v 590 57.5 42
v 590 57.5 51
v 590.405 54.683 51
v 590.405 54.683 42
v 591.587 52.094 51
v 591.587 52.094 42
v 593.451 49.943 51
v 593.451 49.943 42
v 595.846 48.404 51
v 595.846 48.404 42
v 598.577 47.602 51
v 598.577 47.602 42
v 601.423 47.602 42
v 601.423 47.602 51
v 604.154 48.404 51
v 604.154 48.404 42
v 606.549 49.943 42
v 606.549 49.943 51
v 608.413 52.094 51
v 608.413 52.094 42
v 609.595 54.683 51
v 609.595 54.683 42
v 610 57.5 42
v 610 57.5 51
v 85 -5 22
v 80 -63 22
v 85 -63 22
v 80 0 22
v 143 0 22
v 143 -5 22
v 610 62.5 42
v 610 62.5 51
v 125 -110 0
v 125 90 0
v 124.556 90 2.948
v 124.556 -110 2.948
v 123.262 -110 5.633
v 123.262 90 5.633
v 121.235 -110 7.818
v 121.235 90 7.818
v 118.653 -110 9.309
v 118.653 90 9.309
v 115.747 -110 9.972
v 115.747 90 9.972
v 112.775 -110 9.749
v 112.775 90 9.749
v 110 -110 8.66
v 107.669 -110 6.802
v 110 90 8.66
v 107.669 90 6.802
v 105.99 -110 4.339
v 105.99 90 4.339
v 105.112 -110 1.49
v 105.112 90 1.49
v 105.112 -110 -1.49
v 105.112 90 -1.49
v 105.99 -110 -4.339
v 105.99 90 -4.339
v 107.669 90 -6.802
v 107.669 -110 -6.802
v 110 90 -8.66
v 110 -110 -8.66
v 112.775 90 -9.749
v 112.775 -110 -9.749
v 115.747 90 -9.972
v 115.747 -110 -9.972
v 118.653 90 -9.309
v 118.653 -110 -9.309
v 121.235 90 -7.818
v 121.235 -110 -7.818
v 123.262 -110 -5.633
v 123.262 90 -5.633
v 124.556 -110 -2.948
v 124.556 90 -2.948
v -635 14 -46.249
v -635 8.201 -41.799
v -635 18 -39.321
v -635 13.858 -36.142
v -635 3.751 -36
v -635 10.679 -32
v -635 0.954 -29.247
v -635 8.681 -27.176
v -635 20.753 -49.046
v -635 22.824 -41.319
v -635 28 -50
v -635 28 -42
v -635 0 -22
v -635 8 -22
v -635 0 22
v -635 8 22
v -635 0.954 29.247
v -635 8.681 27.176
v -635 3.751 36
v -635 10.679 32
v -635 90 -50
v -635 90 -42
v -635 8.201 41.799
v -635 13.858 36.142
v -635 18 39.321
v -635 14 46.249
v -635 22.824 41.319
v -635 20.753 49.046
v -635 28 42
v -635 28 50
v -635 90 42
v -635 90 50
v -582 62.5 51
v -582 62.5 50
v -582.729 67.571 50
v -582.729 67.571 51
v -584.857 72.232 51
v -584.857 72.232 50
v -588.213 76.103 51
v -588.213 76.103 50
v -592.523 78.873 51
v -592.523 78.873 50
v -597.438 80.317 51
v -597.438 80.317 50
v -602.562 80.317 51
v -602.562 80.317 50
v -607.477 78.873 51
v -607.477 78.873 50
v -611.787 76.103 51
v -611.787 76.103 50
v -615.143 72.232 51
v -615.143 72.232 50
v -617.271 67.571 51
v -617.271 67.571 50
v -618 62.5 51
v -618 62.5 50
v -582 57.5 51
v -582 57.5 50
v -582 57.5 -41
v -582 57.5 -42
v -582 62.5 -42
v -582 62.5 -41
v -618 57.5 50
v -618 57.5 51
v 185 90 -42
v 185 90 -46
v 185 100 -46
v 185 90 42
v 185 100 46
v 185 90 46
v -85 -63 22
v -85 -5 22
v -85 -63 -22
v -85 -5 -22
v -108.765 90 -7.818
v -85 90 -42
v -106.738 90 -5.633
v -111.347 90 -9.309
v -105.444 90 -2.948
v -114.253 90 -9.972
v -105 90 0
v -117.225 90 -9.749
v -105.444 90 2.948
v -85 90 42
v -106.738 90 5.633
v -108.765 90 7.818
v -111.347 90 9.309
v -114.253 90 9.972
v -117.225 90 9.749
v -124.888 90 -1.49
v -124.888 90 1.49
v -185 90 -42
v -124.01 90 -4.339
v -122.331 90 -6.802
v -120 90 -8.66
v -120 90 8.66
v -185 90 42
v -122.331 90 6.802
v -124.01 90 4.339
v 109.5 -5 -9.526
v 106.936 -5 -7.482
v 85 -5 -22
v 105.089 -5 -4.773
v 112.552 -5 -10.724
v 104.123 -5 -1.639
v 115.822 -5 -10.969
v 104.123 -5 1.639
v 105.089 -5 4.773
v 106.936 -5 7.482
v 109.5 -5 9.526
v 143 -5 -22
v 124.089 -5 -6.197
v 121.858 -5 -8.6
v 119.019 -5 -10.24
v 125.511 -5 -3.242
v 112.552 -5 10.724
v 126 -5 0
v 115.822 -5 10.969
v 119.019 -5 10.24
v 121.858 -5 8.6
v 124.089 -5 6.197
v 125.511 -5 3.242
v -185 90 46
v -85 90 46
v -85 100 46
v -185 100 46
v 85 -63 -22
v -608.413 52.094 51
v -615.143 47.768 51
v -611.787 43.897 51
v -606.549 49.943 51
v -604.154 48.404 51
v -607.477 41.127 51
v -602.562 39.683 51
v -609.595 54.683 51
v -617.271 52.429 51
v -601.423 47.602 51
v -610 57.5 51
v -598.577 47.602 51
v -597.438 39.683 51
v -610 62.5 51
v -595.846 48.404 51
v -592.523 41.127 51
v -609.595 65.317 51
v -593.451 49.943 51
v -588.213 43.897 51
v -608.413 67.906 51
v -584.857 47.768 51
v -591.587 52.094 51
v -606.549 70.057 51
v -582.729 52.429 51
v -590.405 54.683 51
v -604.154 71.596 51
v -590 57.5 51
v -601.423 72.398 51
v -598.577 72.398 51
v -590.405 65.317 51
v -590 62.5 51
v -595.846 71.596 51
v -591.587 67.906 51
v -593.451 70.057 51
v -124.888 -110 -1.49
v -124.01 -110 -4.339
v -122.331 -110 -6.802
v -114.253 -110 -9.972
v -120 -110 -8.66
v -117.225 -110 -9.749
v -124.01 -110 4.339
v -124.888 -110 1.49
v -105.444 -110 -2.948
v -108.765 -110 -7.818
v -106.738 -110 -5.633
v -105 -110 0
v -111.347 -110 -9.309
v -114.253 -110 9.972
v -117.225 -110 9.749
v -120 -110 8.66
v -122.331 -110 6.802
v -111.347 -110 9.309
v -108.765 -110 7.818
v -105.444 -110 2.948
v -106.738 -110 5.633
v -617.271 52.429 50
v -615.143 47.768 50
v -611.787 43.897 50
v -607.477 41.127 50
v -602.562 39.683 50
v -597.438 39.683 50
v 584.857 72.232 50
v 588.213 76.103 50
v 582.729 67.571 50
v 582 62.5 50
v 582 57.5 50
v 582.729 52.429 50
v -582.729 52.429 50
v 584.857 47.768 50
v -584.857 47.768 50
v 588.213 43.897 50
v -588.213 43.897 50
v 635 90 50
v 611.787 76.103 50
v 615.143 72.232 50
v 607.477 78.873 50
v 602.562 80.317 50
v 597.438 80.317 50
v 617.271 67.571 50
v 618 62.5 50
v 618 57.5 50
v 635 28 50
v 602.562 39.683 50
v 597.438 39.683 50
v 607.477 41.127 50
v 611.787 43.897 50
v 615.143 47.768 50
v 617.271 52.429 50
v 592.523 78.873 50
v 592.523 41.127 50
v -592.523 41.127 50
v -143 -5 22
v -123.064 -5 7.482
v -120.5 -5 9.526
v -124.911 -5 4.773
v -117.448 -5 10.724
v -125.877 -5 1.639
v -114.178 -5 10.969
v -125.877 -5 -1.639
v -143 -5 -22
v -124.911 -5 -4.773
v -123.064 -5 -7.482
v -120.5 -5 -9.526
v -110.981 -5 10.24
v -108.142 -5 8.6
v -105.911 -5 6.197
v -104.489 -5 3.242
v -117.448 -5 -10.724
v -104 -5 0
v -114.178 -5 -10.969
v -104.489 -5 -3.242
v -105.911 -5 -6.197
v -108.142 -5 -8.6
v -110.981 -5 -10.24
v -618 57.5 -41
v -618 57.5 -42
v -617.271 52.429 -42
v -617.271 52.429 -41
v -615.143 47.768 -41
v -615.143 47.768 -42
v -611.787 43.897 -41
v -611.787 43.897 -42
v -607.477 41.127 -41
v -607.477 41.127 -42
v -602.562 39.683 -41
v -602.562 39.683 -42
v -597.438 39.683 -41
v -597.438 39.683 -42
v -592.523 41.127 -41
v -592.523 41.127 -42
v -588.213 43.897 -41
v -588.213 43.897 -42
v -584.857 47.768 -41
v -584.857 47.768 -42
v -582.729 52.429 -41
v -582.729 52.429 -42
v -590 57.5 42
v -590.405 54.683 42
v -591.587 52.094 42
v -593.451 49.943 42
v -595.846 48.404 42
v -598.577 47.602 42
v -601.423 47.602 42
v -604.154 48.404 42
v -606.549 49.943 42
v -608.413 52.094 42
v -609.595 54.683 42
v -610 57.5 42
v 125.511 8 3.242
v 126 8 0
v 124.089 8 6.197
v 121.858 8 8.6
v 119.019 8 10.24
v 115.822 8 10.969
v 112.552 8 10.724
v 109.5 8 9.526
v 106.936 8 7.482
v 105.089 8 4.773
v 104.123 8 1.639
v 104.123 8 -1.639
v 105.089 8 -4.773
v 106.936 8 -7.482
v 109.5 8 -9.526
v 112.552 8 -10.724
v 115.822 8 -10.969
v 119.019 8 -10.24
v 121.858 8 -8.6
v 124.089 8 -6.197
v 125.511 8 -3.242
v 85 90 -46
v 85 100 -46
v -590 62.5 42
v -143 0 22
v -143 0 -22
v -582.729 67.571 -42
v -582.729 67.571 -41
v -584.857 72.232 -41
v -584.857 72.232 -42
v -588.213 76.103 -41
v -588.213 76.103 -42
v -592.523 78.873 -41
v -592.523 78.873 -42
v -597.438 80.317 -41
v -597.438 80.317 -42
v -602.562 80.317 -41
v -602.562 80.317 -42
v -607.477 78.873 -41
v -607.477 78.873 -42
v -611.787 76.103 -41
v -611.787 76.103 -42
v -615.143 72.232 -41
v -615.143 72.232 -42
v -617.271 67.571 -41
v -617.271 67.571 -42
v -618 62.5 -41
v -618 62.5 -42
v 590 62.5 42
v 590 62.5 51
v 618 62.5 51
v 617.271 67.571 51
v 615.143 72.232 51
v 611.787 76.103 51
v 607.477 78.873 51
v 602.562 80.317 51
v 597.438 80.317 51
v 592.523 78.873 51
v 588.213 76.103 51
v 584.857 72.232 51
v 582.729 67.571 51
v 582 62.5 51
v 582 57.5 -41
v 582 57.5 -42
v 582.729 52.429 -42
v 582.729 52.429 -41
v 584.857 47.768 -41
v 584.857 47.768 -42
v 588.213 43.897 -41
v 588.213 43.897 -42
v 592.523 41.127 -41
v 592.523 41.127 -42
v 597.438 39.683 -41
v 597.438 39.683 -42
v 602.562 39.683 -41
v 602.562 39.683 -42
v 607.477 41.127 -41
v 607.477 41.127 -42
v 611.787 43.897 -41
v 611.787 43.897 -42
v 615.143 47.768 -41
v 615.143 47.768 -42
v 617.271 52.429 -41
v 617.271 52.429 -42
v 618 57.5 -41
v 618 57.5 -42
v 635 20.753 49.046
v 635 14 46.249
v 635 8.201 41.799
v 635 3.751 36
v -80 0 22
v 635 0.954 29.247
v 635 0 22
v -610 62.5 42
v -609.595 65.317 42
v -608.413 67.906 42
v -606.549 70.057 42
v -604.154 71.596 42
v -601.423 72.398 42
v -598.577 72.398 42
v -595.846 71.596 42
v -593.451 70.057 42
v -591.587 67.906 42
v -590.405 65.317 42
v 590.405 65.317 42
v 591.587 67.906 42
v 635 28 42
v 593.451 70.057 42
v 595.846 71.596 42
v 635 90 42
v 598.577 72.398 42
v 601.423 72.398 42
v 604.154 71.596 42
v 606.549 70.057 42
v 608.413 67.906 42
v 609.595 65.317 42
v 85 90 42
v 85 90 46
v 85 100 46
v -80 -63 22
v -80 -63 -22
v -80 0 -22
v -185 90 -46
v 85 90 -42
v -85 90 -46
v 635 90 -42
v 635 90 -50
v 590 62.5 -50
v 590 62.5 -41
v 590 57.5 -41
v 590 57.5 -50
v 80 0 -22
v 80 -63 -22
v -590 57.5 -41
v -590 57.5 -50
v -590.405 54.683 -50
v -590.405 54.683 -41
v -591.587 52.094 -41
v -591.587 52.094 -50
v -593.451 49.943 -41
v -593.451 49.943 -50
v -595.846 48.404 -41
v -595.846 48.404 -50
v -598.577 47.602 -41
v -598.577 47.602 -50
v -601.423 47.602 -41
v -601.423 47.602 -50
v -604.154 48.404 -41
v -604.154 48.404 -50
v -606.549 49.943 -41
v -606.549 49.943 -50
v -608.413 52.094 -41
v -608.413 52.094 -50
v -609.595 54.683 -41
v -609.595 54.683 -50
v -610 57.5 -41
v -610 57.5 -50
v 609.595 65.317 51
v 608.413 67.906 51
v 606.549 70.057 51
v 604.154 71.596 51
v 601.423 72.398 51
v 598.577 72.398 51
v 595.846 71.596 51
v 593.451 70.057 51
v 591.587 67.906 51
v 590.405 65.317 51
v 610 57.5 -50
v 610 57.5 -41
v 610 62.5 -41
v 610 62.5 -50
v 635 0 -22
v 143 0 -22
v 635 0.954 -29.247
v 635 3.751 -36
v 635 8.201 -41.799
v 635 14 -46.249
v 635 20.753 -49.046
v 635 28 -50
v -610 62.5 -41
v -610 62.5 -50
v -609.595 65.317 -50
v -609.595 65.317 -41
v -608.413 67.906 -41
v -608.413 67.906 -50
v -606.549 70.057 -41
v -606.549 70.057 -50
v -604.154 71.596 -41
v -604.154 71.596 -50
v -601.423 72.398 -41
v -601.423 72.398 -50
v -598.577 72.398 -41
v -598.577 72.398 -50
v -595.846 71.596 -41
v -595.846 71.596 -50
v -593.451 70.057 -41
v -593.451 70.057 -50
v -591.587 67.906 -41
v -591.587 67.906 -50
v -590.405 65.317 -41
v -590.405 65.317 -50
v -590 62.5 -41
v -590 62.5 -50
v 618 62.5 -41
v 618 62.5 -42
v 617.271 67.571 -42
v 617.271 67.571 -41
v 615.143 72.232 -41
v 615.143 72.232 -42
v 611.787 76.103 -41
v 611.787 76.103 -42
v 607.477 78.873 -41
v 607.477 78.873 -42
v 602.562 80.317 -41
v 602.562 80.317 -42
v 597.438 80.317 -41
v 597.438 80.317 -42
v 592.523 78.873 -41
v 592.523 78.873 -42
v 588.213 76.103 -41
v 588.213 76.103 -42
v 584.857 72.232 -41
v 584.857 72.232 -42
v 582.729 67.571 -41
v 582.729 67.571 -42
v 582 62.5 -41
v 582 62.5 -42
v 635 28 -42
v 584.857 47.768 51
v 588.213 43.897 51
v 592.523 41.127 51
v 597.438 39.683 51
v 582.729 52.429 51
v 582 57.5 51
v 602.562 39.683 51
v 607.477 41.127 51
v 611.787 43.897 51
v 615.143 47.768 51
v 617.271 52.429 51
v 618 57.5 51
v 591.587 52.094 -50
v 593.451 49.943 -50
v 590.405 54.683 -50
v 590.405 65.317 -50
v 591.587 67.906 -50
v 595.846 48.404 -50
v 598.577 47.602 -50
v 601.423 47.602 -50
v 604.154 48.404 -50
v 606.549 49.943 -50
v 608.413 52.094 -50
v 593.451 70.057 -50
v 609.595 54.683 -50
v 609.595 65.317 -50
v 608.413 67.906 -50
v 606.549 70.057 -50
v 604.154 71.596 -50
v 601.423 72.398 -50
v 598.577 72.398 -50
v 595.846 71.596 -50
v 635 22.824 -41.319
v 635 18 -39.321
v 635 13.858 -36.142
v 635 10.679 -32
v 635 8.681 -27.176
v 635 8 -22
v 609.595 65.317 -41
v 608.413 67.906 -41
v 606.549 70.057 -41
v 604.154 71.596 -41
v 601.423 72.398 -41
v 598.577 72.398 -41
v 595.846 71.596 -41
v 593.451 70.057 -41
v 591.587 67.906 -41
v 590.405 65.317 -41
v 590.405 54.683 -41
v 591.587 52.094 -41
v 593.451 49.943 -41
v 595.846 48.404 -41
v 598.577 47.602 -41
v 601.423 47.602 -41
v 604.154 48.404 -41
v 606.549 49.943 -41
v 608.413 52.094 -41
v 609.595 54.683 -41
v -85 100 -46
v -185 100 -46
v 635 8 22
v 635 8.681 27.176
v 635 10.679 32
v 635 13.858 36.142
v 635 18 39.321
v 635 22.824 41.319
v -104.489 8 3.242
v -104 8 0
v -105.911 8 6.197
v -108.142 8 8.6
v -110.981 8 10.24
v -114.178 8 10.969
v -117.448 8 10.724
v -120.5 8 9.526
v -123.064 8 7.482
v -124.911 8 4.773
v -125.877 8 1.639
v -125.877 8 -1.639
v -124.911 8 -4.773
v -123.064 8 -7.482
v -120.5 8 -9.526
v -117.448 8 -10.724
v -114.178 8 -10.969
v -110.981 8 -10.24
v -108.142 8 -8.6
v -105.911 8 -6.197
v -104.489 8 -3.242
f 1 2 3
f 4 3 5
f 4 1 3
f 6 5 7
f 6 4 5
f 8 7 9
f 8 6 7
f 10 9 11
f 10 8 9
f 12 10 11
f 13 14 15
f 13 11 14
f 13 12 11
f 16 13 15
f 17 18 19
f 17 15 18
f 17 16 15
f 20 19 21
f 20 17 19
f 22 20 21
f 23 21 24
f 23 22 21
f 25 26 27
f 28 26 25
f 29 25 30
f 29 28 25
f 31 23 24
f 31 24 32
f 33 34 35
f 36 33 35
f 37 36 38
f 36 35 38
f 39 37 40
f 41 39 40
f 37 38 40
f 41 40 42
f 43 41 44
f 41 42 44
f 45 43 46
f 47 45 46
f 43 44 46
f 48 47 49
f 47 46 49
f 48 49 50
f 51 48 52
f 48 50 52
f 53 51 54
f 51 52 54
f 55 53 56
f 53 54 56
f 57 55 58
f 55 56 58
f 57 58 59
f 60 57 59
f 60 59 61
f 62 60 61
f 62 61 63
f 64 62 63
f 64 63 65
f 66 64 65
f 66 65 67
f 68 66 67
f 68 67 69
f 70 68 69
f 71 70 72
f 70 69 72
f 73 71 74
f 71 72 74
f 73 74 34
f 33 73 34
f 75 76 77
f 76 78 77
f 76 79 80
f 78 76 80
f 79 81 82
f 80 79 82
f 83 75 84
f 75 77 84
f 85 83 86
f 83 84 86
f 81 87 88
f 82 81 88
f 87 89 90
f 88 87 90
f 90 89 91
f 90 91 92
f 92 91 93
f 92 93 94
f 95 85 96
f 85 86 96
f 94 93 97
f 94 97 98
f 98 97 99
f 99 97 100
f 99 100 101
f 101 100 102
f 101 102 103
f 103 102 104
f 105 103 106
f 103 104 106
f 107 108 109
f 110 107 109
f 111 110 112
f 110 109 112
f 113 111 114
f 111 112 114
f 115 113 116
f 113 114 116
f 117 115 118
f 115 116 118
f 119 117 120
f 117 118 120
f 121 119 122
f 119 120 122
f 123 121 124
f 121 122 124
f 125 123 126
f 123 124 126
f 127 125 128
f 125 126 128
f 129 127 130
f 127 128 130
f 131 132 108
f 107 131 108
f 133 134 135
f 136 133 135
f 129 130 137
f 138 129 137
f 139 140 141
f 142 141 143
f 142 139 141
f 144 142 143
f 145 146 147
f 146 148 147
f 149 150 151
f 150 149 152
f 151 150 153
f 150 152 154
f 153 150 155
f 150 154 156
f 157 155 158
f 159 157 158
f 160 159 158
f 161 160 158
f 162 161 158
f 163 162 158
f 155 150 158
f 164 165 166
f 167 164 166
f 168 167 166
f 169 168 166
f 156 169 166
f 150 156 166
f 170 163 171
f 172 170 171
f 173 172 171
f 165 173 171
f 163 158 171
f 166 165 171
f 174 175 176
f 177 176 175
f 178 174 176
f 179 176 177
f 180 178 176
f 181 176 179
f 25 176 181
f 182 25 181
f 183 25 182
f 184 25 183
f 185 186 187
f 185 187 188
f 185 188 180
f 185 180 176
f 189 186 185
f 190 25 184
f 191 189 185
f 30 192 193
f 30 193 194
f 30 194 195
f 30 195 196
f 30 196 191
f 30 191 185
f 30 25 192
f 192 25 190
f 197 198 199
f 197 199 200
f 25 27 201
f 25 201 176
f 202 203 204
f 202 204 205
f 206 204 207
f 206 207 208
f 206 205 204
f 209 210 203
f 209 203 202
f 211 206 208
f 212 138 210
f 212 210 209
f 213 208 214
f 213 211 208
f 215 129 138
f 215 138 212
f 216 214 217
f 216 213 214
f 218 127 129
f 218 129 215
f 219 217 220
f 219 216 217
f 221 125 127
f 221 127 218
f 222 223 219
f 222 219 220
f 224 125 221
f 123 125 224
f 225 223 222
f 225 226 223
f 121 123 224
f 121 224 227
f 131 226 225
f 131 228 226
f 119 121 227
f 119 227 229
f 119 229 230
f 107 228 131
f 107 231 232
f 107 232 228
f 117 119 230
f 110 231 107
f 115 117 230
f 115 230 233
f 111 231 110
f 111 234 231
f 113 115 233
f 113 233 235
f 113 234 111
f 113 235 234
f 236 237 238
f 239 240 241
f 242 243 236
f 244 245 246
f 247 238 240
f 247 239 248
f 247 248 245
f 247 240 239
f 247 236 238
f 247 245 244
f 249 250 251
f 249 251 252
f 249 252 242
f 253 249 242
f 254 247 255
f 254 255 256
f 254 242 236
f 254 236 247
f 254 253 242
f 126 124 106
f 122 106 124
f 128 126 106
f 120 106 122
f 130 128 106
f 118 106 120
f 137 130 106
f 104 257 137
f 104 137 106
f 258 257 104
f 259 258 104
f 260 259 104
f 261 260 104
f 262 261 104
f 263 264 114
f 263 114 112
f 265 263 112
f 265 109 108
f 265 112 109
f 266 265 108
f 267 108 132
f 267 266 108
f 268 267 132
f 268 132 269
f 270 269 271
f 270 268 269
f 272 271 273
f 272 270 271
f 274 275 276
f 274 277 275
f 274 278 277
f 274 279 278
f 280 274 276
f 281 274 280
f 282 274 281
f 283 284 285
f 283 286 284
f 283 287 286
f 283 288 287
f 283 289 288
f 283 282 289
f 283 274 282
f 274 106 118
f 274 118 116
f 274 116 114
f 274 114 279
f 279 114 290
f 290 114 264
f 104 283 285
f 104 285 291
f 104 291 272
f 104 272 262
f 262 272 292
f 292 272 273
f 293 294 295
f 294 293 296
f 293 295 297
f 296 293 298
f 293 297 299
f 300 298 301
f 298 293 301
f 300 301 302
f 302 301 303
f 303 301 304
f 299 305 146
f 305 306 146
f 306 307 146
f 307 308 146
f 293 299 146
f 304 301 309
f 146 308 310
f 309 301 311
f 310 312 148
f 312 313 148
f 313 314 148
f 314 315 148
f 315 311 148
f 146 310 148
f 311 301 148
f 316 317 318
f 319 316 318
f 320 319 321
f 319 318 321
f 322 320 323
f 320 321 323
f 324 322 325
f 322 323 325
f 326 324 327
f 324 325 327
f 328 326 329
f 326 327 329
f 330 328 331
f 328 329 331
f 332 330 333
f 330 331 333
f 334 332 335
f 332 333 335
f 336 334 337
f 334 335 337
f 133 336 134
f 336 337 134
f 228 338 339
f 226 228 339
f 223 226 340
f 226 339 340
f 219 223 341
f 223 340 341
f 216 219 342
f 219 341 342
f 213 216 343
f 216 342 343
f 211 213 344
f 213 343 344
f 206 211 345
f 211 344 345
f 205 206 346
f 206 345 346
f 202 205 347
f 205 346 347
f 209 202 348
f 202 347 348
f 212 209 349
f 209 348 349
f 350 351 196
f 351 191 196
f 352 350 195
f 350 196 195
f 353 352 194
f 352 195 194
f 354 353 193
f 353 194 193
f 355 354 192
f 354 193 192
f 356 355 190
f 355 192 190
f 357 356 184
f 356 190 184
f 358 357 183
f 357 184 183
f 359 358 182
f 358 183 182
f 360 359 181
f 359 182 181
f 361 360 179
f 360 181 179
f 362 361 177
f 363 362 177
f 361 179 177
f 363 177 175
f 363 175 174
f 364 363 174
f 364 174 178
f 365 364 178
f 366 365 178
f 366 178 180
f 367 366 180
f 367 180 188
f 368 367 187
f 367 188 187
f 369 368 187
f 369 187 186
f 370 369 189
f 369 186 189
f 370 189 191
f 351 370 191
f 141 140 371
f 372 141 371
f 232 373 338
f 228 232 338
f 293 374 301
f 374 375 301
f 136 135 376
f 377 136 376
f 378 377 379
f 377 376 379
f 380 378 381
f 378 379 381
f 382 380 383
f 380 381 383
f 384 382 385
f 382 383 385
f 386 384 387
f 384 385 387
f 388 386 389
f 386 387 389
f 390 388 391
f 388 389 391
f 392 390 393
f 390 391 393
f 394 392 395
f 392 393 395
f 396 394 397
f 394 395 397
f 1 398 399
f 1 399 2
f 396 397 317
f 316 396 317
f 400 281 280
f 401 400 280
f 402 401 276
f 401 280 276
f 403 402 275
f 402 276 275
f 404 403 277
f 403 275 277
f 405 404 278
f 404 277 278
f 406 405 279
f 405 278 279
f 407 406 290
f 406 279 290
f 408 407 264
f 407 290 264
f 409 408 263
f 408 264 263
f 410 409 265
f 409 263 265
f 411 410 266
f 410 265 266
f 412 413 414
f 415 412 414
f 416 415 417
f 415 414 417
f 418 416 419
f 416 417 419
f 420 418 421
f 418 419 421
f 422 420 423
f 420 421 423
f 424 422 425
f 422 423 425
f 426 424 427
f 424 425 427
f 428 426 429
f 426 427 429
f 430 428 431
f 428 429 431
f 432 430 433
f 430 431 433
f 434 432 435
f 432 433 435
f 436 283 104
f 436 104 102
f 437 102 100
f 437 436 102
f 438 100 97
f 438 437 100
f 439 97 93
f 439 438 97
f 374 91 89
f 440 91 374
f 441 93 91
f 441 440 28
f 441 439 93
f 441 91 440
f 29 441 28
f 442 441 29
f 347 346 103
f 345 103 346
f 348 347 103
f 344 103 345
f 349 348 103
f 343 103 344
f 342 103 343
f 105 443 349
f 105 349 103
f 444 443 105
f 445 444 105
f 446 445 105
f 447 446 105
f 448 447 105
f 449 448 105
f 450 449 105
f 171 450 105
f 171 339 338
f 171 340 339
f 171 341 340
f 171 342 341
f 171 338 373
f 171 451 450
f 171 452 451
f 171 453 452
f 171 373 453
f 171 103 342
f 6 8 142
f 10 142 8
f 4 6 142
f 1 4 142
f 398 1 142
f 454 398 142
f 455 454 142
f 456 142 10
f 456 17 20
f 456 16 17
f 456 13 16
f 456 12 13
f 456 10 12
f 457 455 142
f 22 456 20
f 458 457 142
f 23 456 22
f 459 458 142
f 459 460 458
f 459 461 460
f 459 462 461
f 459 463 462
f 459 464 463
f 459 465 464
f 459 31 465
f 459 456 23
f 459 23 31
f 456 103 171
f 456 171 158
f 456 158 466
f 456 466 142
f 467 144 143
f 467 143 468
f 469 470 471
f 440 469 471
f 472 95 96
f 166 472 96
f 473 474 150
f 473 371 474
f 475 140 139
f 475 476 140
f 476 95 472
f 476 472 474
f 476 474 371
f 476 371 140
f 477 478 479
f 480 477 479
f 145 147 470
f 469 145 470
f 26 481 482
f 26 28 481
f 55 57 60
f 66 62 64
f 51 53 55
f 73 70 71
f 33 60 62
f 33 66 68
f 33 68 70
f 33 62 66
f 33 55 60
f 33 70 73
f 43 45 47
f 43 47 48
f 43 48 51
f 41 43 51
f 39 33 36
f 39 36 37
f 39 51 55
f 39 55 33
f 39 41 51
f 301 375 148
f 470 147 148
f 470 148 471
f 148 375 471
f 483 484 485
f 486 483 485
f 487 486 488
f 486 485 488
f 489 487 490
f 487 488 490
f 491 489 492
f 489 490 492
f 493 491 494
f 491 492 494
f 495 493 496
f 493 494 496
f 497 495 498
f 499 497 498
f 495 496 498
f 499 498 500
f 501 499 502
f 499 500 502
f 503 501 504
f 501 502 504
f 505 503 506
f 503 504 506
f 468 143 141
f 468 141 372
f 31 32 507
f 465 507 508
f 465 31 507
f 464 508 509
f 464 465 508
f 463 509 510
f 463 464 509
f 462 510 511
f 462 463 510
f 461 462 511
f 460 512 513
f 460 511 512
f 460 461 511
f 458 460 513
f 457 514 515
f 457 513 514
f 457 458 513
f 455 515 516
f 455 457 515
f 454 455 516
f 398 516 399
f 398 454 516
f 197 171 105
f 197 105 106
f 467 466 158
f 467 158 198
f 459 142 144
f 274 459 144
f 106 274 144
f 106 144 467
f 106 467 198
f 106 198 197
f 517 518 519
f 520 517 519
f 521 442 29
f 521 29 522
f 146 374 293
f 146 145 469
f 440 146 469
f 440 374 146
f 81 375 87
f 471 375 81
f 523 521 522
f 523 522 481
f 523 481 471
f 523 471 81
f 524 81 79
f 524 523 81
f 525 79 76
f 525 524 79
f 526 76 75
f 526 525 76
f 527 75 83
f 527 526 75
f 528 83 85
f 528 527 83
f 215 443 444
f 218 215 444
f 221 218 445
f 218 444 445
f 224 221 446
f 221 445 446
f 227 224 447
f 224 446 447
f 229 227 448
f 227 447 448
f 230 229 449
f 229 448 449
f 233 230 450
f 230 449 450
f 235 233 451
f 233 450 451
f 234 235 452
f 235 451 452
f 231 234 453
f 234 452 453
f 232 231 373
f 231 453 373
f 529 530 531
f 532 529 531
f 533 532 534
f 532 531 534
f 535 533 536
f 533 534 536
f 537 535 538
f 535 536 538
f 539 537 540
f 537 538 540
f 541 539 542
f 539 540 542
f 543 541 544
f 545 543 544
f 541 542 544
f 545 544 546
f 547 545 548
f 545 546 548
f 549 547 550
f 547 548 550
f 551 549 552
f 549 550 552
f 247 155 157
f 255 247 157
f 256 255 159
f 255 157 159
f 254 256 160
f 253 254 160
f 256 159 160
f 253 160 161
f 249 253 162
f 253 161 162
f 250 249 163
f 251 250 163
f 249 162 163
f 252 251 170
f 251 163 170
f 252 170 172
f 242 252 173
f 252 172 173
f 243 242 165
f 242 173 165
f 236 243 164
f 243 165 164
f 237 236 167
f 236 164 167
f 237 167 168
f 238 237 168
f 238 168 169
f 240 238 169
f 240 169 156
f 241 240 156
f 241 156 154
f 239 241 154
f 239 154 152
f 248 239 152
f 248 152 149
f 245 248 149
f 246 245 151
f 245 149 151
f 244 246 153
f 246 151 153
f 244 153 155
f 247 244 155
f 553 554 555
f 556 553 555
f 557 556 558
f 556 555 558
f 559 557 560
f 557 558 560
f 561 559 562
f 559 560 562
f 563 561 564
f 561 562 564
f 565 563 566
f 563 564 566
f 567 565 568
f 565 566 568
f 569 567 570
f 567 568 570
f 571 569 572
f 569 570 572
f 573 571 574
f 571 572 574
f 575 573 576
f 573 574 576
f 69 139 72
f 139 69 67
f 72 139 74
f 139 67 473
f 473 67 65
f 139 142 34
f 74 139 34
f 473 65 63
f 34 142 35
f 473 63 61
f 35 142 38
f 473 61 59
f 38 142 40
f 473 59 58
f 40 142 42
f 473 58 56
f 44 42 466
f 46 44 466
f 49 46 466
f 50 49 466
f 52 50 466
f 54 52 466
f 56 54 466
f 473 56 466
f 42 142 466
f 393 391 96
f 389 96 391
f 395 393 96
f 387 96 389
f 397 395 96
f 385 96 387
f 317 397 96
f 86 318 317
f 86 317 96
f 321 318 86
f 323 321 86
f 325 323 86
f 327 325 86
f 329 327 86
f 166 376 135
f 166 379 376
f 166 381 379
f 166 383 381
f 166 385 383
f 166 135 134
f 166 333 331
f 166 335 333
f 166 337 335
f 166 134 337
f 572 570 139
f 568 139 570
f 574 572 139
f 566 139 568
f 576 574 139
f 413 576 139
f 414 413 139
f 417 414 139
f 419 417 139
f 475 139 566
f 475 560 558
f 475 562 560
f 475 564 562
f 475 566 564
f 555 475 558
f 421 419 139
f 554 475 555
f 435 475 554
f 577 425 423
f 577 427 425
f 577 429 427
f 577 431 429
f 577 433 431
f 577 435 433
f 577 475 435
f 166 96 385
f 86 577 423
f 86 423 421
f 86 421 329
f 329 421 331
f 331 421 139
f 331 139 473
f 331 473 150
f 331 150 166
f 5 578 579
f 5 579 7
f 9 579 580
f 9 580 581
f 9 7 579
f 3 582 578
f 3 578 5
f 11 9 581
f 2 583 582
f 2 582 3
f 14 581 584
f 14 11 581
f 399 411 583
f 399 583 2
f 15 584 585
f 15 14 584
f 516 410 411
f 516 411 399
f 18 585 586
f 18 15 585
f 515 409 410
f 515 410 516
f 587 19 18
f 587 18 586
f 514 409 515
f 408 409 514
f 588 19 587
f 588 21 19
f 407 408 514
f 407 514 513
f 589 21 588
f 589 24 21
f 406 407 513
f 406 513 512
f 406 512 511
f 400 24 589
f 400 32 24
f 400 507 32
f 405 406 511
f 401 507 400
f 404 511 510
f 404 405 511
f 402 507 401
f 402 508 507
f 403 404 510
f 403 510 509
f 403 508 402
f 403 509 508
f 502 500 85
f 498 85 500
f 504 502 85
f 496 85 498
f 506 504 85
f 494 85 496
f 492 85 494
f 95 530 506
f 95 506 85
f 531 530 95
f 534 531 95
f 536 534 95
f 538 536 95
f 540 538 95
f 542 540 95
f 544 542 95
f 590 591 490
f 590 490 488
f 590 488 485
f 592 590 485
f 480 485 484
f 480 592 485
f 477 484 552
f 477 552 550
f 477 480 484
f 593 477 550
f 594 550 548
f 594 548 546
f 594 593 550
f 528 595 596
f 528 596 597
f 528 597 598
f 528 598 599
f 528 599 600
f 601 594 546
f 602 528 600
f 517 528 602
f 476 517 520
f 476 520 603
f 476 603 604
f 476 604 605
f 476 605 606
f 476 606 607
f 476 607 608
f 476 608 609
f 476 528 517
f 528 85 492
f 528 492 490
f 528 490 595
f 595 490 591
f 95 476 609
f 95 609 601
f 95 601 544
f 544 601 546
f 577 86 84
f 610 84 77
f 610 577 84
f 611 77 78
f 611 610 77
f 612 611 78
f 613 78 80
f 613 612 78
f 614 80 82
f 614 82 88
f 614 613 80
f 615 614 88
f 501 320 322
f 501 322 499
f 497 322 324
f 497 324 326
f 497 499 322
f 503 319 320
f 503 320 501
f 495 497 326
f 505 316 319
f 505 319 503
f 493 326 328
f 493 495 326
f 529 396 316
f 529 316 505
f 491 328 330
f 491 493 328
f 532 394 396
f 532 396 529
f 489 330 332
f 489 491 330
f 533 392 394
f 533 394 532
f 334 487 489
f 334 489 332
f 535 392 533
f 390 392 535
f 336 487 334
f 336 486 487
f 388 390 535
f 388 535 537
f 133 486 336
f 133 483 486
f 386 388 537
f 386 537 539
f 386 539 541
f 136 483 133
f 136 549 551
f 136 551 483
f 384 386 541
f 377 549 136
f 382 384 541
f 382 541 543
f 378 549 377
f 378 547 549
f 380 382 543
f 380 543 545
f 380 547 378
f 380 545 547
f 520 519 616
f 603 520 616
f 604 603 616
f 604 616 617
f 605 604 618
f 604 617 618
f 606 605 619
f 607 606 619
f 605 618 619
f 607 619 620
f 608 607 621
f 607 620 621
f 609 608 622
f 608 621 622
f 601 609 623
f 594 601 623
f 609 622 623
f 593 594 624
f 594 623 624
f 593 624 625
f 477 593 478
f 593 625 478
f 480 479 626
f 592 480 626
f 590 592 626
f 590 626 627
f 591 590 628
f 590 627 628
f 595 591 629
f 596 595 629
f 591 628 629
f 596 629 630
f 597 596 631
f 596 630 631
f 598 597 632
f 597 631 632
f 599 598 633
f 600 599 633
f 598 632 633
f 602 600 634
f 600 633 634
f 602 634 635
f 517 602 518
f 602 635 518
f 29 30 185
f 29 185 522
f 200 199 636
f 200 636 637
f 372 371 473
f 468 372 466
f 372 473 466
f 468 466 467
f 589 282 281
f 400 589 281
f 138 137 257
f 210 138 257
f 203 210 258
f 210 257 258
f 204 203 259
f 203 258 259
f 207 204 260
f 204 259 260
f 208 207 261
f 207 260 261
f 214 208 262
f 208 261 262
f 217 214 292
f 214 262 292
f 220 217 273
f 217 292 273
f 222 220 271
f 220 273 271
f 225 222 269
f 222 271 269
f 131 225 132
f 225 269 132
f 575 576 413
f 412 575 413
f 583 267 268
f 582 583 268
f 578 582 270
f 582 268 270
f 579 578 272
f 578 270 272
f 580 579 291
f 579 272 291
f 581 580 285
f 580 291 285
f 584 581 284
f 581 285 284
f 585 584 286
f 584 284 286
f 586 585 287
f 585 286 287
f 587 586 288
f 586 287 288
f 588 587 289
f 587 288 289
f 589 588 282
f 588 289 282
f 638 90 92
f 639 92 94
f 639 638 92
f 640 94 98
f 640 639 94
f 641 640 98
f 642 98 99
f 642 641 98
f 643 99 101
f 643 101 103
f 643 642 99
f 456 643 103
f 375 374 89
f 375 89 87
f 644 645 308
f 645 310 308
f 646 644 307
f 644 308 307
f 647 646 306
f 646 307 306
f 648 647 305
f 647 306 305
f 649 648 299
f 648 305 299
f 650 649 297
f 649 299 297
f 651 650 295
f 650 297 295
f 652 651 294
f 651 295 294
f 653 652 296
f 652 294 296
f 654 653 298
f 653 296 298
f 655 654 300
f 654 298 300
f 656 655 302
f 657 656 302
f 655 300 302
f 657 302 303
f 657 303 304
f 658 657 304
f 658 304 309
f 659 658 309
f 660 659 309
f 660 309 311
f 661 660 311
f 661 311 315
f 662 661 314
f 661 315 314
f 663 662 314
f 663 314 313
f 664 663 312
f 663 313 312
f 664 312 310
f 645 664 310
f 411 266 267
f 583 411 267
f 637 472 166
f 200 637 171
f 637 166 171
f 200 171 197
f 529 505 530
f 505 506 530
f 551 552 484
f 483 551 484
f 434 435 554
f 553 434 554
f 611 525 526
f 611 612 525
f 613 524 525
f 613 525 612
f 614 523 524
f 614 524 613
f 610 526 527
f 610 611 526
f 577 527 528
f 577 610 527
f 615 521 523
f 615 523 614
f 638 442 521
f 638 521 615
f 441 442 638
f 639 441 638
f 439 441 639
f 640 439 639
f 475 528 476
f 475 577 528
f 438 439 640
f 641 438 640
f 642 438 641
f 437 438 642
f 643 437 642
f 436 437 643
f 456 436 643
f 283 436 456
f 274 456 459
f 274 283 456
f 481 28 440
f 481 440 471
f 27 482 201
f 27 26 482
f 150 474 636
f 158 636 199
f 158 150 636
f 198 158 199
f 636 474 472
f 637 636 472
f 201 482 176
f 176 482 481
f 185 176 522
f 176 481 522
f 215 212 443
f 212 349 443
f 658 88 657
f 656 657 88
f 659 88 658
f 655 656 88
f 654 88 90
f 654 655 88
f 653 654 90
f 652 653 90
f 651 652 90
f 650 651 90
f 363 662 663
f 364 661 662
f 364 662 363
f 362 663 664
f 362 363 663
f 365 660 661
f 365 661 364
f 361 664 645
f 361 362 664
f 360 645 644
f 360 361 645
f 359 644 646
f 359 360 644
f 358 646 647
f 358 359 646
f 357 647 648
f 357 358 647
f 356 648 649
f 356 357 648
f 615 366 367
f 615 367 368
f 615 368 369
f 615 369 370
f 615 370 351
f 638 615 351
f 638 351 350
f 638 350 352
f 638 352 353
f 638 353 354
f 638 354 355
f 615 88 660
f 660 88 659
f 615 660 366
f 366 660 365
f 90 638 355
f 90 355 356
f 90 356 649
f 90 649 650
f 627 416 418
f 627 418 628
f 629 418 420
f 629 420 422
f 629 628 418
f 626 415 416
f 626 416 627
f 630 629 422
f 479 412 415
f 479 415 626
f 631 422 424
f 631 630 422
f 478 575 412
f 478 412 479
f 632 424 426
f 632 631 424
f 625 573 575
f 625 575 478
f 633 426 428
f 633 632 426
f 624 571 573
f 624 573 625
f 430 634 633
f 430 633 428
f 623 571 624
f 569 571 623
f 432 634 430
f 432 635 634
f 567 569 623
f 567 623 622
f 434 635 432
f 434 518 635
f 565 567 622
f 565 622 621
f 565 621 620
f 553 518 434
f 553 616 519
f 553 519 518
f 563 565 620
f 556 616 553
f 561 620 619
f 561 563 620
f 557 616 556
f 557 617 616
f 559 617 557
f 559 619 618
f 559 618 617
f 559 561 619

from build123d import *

# Parameters (mm, degrees)
F1_DEPTH      = 635
F3_DEPTH      = 22
F4_W          = 100
F4_H          = 92
F5_DEPTH      = 10
F6_R          = 11
F7_DEPTH      = 8
F7_DEPTH_BACK = 63.001
F9_DEPTH      = 50.001
F9_DEPTH_BACK = 50.001
F11_DEPTH     = 1
F13_DEPTH     = 1
F14_R         = 10
F15_DEPTH     = 200


with BuildPart() as f1:
    # F0 (on Right) → F1 (new body, symmetric)
    with BuildSketch(Plane.YZ):
        with BuildLine():
            Line((90, 42), (90, 50))
            Line((90, 50), (28, 50))
            ThreePointArc((28, 50), (8.2010101268, 41.7989898732), (0, 22))
            Line((0, 22), (0, -22))
            ThreePointArc((0, -22), (8.2010101268, -41.7989898732), (28, -50))
            Line((28, -50), (90, -50))
            Line((90, -50), (90, -42))
            Line((90, -42), (28, -42))
            ThreePointArc((28, -42), (13.8578643763, -36.1421356237), (8, -22))
            Line((8, -22), (8, 22))
            ThreePointArc((8, 22), (13.8578643763, 36.1421356237), (28, 42))
            Line((28, 42), (90, 42))
        make_face()
    extrude(amount=F1_DEPTH, both=True)

    # F2 (on Top) → F3 (join, symmetric)
    with BuildSketch(Plane.XY):
        Polygon((-80, 0), (-143, 0), (-143, -5), (-85, -5), (-85, -63), (-80, -63), align=None)
        Polygon((80, -63), (85, -63), (85, -5), (143, -5), (143, 0), (80, 0), align=None)
    extrude(amount=F3_DEPTH, both=True)

    # F4 (on face) → F5 (join)
    with BuildSketch(Plane(origin=(0, 90, 0), x_dir=(-1, 0, 0), z_dir=(0, 1, 0))):
        with Locations((-135, 0)):
            Rectangle(F4_W, F4_H)
        with Locations((135, 0)):
            Rectangle(F4_W, F4_H)
    extrude(amount=F5_DEPTH)

    # F6 (on Front) → F7 (cut, two sides)
    with BuildSketch(Plane.XZ) as f7_sk:
        with Locations((-115, 0)):
            Circle(F6_R)
        with Locations((115, 0)):
            Circle(F6_R)
    extrude(amount=-F7_DEPTH, mode=Mode.SUBTRACT)
    extrude(f7_sk.sketch, amount=F7_DEPTH_BACK, mode=Mode.SUBTRACT)

    # F8 (on Top) → F9 (cut, two sides)
    with BuildSketch(Plane.XY) as f9_sk:
        with BuildLine():
            Line((-590, 57.5), (-590, 62.5))
            ThreePointArc((-590, 62.5), (-600, 72.5), (-610, 62.5))
            Line((-610, 62.5), (-610, 57.5))
            ThreePointArc((-610, 57.5), (-600, 47.5), (-590, 57.5))
        make_face()
        with BuildLine():
            ThreePointArc((610, 62.5), (600, 72.5), (590, 62.5))
            Line((590, 62.5), (590, 57.5))
            ThreePointArc((590, 57.5), (600, 47.5), (610, 57.5))
            Line((610, 57.5), (610, 62.5))
        make_face()
    extrude(amount=F9_DEPTH, mode=Mode.SUBTRACT)
    extrude(f9_sk.sketch, amount=-F9_DEPTH_BACK, mode=Mode.SUBTRACT)

    # F10 (on face) → F11 (join)
    with BuildSketch(Plane.XY.offset(50)):
        with BuildLine():
            Line((-582, 57.5), (-582, 62.5))
            ThreePointArc((-582, 62.5), (-600, 80.5), (-618, 62.5))
            Line((-618, 62.5), (-618, 57.5))
            ThreePointArc((-618, 57.5), (-600, 39.5), (-582, 57.5))
        make_face()
        with BuildLine():
            Line((-610, 57.5), (-610, 62.5))
            ThreePointArc((-610, 62.5), (-600, 72.5), (-590, 62.5))
            Line((-590, 62.5), (-590, 57.5))
            ThreePointArc((-590, 57.5), (-600, 47.5), (-610, 57.5))
        make_face(mode=Mode.SUBTRACT)
        with BuildLine():
            Line((618, 57.5), (618, 62.5))
            ThreePointArc((618, 62.5), (600, 80.5), (582, 62.5))
            Line((582, 62.5), (582, 57.5))
            ThreePointArc((582, 57.5), (600, 39.5), (618, 57.5))
        make_face()
        with BuildLine():
            ThreePointArc((610, 57.5), (600, 47.5), (590, 57.5))
            Line((590, 57.5), (590, 62.5))
            ThreePointArc((590, 62.5), (600, 72.5), (610, 62.5))
            Line((610, 62.5), (610, 57.5))
        make_face(mode=Mode.SUBTRACT)
    extrude(amount=F11_DEPTH)

    # F12 (on face) → F13 (join)
    with BuildSketch(Plane.XY.offset(-42)):
        with BuildLine():
            ThreePointArc((-582, 62.5), (-600, 80.5), (-618, 62.5))
            Line((-618, 62.5), (-618, 57.5))
            ThreePointArc((-618, 57.5), (-600, 39.5), (-582, 57.5))
            Line((-582, 57.5), (-582, 62.5))
        make_face()
        with BuildLine():
            Line((-610, 57.5), (-610, 62.5))
            ThreePointArc((-610, 62.5), (-600, 72.5), (-590, 62.5))
            Line((-590, 62.5), (-590, 57.5))
            ThreePointArc((-590, 57.5), (-600, 47.5), (-610, 57.5))
        make_face(mode=Mode.SUBTRACT)
        with BuildLine():
            ThreePointArc((618, 62.5), (600, 80.5), (582, 62.5))
            Line((582, 62.5), (582, 57.5))
            ThreePointArc((582, 57.5), (600, 39.5), (618, 57.5))
            Line((618, 57.5), (618, 62.5))
        make_face()
        with BuildLine():
            ThreePointArc((590, 62.5), (600, 72.5), (610, 62.5))
            Line((610, 62.5), (610, 57.5))
            ThreePointArc((610, 57.5), (600, 47.5), (590, 57.5))
            Line((590, 57.5), (590, 62.5))
        make_face(mode=Mode.SUBTRACT)
    extrude(amount=F13_DEPTH)

    # F14 (on face) → F15 (join)
    with BuildSketch(Plane.XZ.offset(-90)):
        with Locations((-115, 0)):
            Circle(F14_R)
        with Locations((115, 0)):
            Circle(F14_R)
    extrude(amount=F15_DEPTH)


solid = f1.part
